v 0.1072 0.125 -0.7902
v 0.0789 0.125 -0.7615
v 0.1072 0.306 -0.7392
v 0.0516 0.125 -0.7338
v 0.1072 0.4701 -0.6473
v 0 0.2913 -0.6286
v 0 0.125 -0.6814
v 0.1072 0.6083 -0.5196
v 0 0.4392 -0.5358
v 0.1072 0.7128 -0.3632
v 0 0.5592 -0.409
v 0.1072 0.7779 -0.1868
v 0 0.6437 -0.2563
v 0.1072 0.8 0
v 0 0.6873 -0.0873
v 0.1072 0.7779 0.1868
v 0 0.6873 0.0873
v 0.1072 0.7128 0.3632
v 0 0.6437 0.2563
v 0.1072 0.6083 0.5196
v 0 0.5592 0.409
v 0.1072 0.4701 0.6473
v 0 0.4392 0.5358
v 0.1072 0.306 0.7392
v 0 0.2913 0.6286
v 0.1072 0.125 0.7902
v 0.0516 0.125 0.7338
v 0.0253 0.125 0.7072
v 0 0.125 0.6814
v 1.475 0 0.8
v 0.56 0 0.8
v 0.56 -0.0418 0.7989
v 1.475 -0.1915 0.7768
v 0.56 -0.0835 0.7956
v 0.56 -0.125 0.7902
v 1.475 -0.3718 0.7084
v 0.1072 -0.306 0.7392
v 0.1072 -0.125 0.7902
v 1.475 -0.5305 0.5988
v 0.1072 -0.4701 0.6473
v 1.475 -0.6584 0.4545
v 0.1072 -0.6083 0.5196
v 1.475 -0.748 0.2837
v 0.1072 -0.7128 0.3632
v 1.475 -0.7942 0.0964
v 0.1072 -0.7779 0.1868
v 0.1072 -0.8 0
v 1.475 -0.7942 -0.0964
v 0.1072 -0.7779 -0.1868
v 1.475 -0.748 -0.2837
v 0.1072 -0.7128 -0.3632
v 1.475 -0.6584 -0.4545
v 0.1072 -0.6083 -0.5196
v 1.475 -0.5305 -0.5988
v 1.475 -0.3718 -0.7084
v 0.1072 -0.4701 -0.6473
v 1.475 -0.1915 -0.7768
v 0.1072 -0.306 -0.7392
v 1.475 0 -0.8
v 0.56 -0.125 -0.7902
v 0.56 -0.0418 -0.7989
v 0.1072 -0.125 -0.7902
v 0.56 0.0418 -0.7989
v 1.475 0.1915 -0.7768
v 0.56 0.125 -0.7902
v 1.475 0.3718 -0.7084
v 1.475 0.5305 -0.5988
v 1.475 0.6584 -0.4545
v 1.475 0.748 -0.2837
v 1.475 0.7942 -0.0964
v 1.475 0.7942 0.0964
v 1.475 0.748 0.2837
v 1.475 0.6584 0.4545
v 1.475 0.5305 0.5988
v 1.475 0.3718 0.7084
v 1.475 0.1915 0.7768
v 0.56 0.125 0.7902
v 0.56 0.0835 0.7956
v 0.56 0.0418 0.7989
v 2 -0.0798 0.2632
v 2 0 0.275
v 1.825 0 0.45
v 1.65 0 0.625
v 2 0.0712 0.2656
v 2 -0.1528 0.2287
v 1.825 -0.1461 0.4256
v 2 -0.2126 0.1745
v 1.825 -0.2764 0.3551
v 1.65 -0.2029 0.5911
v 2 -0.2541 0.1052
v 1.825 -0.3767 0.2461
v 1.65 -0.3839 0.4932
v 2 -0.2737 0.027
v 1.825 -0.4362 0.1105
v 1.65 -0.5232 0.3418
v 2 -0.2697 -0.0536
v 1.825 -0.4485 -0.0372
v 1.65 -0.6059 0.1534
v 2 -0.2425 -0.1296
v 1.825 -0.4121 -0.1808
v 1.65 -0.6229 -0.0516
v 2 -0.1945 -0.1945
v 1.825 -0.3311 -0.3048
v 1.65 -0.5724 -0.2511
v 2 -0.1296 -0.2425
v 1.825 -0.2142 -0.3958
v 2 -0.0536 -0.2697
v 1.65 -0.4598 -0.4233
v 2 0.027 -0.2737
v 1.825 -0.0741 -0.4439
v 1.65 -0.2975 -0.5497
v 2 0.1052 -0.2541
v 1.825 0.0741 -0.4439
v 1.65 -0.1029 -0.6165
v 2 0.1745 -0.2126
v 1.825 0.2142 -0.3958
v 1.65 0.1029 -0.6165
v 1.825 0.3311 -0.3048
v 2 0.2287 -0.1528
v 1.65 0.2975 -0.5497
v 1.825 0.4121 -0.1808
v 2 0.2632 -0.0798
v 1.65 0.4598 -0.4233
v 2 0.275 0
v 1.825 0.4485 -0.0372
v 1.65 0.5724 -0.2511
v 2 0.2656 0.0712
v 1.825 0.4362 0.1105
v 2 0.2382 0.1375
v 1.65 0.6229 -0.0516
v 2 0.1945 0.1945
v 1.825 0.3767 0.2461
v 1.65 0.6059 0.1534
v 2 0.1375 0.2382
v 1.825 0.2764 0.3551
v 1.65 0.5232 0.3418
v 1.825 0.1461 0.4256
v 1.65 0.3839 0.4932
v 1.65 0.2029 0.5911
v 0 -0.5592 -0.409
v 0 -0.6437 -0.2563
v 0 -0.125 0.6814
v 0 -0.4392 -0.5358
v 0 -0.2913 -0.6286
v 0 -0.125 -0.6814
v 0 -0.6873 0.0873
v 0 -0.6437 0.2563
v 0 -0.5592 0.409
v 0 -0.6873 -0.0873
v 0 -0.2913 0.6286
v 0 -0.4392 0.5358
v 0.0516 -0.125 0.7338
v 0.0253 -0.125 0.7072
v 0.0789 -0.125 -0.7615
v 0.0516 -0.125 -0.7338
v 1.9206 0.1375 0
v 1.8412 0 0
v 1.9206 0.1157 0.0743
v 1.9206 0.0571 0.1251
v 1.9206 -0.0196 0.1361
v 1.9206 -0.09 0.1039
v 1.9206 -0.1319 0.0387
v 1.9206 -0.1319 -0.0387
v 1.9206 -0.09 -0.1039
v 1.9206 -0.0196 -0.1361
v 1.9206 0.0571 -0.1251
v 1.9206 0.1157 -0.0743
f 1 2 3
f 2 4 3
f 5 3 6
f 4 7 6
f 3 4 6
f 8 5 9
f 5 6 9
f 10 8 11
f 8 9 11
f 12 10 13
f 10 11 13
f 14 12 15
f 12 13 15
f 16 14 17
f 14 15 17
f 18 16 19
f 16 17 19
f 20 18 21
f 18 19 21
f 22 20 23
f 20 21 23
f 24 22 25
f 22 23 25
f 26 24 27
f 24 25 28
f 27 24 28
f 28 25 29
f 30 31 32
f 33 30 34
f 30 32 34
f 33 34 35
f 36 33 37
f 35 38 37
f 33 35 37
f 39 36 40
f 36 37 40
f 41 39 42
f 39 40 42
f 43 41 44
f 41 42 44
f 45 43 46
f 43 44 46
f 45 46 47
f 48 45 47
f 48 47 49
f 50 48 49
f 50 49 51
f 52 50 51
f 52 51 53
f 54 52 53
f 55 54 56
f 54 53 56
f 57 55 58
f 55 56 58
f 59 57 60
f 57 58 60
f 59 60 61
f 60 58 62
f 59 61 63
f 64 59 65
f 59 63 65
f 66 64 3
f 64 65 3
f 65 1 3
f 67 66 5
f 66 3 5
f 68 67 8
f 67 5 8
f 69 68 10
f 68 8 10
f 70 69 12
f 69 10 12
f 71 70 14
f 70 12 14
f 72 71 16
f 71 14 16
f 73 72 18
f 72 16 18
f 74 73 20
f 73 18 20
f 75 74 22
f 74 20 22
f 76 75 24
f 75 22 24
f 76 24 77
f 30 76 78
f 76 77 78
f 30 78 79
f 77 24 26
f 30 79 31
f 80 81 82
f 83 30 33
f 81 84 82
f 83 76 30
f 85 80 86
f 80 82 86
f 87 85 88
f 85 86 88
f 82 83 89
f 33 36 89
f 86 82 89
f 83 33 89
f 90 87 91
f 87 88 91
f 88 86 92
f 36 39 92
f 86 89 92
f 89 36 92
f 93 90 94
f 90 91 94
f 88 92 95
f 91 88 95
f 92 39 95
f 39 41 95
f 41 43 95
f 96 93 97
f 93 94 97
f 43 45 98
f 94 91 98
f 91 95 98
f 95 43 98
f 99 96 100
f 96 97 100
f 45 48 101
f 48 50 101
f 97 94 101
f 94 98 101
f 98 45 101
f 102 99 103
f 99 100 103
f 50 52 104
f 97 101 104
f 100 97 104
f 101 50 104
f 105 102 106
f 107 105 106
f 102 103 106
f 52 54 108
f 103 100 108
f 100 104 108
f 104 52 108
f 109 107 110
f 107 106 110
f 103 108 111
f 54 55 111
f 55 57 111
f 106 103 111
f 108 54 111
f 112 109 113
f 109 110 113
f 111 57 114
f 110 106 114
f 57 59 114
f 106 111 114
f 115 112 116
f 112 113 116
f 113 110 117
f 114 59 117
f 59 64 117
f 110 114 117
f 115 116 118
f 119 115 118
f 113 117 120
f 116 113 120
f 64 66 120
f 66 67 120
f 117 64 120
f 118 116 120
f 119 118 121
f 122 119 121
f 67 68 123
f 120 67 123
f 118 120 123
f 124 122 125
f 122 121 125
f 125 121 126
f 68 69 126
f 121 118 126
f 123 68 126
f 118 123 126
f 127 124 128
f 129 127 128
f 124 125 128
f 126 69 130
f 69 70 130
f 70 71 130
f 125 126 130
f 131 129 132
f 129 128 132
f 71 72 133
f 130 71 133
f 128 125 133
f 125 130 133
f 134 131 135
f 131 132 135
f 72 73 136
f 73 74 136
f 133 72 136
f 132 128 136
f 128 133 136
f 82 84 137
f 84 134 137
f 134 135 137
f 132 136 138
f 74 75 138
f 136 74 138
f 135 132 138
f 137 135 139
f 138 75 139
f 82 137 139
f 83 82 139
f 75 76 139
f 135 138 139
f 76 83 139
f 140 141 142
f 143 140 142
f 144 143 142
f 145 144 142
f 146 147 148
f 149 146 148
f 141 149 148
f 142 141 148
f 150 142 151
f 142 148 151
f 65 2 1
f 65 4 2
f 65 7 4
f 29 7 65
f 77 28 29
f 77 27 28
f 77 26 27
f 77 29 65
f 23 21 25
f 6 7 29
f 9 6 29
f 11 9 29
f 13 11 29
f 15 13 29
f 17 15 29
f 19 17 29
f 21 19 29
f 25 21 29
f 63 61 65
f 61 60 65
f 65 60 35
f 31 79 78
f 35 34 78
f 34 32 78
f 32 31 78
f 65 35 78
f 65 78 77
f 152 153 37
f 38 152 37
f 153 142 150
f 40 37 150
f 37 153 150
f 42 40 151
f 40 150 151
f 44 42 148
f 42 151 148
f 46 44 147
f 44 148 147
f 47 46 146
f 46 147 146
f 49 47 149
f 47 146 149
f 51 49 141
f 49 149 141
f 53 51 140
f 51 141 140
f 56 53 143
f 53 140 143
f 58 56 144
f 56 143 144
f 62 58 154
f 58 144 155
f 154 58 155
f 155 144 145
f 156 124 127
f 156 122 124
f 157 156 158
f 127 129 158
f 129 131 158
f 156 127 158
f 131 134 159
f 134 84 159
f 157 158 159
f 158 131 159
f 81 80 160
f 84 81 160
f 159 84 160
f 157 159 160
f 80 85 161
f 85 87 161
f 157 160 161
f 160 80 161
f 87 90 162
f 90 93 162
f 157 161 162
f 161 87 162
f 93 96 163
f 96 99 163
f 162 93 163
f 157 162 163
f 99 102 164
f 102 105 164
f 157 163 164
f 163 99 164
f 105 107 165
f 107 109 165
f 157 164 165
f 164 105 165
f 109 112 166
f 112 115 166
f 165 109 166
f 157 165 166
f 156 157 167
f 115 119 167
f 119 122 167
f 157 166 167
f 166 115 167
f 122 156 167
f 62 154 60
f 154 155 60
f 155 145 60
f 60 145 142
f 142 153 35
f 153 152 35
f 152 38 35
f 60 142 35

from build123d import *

# Parameters (mm, degrees)
SKETCH_3_W          = 0.56
SKETCH_3_H          = 0.25
CUT_EXTRUDE_1_DEPTH = 50


with BuildPart() as part:
    # 草图2 → Revolve 583 (revolve)
    with BuildSketch(Plane.XY, mode=Mode.PRIVATE) as revolve_583_sk:
        Polygon((0, 0), (2, 0), (2, 0.275), (1.475, 0.8), (0.1072, 0.8), (0, 0.6928), align=None)
    revolve(revolve_583_sk.sketch.rotate(Axis((5.249298441, 0, 0), (1, 0, 0)), 90), axis=Axis((5.249298441, 0, 0), (1, 0, 0)))

    # 草图3 → 切除-拉伸1 (cut, symmetric)
    with BuildSketch(Plane.XY):
        with Locations((0.28, 0)):
            Rectangle(SKETCH_3_W, SKETCH_3_H)
    extrude(amount=CUT_EXTRUDE_1_DEPTH, both=True, mode=Mode.SUBTRACT)

    # 草图5 → 切除-旋转2 (revolve, cut)
    with BuildSketch(Plane.XY, mode=Mode.PRIVATE) as cut_revolve_2_sk:
        Polygon((2, 0), (1.841228676, 0), (2, -0.275), align=None)
    revolve(cut_revolve_2_sk.sketch.rotate(Axis((7.723304106, 0, 0), (1, 0, 0)), 180), axis=Axis((7.723304106, 0, 0), (1, 0, 0)), mode=Mode.SUBTRACT)


solid = part.part
